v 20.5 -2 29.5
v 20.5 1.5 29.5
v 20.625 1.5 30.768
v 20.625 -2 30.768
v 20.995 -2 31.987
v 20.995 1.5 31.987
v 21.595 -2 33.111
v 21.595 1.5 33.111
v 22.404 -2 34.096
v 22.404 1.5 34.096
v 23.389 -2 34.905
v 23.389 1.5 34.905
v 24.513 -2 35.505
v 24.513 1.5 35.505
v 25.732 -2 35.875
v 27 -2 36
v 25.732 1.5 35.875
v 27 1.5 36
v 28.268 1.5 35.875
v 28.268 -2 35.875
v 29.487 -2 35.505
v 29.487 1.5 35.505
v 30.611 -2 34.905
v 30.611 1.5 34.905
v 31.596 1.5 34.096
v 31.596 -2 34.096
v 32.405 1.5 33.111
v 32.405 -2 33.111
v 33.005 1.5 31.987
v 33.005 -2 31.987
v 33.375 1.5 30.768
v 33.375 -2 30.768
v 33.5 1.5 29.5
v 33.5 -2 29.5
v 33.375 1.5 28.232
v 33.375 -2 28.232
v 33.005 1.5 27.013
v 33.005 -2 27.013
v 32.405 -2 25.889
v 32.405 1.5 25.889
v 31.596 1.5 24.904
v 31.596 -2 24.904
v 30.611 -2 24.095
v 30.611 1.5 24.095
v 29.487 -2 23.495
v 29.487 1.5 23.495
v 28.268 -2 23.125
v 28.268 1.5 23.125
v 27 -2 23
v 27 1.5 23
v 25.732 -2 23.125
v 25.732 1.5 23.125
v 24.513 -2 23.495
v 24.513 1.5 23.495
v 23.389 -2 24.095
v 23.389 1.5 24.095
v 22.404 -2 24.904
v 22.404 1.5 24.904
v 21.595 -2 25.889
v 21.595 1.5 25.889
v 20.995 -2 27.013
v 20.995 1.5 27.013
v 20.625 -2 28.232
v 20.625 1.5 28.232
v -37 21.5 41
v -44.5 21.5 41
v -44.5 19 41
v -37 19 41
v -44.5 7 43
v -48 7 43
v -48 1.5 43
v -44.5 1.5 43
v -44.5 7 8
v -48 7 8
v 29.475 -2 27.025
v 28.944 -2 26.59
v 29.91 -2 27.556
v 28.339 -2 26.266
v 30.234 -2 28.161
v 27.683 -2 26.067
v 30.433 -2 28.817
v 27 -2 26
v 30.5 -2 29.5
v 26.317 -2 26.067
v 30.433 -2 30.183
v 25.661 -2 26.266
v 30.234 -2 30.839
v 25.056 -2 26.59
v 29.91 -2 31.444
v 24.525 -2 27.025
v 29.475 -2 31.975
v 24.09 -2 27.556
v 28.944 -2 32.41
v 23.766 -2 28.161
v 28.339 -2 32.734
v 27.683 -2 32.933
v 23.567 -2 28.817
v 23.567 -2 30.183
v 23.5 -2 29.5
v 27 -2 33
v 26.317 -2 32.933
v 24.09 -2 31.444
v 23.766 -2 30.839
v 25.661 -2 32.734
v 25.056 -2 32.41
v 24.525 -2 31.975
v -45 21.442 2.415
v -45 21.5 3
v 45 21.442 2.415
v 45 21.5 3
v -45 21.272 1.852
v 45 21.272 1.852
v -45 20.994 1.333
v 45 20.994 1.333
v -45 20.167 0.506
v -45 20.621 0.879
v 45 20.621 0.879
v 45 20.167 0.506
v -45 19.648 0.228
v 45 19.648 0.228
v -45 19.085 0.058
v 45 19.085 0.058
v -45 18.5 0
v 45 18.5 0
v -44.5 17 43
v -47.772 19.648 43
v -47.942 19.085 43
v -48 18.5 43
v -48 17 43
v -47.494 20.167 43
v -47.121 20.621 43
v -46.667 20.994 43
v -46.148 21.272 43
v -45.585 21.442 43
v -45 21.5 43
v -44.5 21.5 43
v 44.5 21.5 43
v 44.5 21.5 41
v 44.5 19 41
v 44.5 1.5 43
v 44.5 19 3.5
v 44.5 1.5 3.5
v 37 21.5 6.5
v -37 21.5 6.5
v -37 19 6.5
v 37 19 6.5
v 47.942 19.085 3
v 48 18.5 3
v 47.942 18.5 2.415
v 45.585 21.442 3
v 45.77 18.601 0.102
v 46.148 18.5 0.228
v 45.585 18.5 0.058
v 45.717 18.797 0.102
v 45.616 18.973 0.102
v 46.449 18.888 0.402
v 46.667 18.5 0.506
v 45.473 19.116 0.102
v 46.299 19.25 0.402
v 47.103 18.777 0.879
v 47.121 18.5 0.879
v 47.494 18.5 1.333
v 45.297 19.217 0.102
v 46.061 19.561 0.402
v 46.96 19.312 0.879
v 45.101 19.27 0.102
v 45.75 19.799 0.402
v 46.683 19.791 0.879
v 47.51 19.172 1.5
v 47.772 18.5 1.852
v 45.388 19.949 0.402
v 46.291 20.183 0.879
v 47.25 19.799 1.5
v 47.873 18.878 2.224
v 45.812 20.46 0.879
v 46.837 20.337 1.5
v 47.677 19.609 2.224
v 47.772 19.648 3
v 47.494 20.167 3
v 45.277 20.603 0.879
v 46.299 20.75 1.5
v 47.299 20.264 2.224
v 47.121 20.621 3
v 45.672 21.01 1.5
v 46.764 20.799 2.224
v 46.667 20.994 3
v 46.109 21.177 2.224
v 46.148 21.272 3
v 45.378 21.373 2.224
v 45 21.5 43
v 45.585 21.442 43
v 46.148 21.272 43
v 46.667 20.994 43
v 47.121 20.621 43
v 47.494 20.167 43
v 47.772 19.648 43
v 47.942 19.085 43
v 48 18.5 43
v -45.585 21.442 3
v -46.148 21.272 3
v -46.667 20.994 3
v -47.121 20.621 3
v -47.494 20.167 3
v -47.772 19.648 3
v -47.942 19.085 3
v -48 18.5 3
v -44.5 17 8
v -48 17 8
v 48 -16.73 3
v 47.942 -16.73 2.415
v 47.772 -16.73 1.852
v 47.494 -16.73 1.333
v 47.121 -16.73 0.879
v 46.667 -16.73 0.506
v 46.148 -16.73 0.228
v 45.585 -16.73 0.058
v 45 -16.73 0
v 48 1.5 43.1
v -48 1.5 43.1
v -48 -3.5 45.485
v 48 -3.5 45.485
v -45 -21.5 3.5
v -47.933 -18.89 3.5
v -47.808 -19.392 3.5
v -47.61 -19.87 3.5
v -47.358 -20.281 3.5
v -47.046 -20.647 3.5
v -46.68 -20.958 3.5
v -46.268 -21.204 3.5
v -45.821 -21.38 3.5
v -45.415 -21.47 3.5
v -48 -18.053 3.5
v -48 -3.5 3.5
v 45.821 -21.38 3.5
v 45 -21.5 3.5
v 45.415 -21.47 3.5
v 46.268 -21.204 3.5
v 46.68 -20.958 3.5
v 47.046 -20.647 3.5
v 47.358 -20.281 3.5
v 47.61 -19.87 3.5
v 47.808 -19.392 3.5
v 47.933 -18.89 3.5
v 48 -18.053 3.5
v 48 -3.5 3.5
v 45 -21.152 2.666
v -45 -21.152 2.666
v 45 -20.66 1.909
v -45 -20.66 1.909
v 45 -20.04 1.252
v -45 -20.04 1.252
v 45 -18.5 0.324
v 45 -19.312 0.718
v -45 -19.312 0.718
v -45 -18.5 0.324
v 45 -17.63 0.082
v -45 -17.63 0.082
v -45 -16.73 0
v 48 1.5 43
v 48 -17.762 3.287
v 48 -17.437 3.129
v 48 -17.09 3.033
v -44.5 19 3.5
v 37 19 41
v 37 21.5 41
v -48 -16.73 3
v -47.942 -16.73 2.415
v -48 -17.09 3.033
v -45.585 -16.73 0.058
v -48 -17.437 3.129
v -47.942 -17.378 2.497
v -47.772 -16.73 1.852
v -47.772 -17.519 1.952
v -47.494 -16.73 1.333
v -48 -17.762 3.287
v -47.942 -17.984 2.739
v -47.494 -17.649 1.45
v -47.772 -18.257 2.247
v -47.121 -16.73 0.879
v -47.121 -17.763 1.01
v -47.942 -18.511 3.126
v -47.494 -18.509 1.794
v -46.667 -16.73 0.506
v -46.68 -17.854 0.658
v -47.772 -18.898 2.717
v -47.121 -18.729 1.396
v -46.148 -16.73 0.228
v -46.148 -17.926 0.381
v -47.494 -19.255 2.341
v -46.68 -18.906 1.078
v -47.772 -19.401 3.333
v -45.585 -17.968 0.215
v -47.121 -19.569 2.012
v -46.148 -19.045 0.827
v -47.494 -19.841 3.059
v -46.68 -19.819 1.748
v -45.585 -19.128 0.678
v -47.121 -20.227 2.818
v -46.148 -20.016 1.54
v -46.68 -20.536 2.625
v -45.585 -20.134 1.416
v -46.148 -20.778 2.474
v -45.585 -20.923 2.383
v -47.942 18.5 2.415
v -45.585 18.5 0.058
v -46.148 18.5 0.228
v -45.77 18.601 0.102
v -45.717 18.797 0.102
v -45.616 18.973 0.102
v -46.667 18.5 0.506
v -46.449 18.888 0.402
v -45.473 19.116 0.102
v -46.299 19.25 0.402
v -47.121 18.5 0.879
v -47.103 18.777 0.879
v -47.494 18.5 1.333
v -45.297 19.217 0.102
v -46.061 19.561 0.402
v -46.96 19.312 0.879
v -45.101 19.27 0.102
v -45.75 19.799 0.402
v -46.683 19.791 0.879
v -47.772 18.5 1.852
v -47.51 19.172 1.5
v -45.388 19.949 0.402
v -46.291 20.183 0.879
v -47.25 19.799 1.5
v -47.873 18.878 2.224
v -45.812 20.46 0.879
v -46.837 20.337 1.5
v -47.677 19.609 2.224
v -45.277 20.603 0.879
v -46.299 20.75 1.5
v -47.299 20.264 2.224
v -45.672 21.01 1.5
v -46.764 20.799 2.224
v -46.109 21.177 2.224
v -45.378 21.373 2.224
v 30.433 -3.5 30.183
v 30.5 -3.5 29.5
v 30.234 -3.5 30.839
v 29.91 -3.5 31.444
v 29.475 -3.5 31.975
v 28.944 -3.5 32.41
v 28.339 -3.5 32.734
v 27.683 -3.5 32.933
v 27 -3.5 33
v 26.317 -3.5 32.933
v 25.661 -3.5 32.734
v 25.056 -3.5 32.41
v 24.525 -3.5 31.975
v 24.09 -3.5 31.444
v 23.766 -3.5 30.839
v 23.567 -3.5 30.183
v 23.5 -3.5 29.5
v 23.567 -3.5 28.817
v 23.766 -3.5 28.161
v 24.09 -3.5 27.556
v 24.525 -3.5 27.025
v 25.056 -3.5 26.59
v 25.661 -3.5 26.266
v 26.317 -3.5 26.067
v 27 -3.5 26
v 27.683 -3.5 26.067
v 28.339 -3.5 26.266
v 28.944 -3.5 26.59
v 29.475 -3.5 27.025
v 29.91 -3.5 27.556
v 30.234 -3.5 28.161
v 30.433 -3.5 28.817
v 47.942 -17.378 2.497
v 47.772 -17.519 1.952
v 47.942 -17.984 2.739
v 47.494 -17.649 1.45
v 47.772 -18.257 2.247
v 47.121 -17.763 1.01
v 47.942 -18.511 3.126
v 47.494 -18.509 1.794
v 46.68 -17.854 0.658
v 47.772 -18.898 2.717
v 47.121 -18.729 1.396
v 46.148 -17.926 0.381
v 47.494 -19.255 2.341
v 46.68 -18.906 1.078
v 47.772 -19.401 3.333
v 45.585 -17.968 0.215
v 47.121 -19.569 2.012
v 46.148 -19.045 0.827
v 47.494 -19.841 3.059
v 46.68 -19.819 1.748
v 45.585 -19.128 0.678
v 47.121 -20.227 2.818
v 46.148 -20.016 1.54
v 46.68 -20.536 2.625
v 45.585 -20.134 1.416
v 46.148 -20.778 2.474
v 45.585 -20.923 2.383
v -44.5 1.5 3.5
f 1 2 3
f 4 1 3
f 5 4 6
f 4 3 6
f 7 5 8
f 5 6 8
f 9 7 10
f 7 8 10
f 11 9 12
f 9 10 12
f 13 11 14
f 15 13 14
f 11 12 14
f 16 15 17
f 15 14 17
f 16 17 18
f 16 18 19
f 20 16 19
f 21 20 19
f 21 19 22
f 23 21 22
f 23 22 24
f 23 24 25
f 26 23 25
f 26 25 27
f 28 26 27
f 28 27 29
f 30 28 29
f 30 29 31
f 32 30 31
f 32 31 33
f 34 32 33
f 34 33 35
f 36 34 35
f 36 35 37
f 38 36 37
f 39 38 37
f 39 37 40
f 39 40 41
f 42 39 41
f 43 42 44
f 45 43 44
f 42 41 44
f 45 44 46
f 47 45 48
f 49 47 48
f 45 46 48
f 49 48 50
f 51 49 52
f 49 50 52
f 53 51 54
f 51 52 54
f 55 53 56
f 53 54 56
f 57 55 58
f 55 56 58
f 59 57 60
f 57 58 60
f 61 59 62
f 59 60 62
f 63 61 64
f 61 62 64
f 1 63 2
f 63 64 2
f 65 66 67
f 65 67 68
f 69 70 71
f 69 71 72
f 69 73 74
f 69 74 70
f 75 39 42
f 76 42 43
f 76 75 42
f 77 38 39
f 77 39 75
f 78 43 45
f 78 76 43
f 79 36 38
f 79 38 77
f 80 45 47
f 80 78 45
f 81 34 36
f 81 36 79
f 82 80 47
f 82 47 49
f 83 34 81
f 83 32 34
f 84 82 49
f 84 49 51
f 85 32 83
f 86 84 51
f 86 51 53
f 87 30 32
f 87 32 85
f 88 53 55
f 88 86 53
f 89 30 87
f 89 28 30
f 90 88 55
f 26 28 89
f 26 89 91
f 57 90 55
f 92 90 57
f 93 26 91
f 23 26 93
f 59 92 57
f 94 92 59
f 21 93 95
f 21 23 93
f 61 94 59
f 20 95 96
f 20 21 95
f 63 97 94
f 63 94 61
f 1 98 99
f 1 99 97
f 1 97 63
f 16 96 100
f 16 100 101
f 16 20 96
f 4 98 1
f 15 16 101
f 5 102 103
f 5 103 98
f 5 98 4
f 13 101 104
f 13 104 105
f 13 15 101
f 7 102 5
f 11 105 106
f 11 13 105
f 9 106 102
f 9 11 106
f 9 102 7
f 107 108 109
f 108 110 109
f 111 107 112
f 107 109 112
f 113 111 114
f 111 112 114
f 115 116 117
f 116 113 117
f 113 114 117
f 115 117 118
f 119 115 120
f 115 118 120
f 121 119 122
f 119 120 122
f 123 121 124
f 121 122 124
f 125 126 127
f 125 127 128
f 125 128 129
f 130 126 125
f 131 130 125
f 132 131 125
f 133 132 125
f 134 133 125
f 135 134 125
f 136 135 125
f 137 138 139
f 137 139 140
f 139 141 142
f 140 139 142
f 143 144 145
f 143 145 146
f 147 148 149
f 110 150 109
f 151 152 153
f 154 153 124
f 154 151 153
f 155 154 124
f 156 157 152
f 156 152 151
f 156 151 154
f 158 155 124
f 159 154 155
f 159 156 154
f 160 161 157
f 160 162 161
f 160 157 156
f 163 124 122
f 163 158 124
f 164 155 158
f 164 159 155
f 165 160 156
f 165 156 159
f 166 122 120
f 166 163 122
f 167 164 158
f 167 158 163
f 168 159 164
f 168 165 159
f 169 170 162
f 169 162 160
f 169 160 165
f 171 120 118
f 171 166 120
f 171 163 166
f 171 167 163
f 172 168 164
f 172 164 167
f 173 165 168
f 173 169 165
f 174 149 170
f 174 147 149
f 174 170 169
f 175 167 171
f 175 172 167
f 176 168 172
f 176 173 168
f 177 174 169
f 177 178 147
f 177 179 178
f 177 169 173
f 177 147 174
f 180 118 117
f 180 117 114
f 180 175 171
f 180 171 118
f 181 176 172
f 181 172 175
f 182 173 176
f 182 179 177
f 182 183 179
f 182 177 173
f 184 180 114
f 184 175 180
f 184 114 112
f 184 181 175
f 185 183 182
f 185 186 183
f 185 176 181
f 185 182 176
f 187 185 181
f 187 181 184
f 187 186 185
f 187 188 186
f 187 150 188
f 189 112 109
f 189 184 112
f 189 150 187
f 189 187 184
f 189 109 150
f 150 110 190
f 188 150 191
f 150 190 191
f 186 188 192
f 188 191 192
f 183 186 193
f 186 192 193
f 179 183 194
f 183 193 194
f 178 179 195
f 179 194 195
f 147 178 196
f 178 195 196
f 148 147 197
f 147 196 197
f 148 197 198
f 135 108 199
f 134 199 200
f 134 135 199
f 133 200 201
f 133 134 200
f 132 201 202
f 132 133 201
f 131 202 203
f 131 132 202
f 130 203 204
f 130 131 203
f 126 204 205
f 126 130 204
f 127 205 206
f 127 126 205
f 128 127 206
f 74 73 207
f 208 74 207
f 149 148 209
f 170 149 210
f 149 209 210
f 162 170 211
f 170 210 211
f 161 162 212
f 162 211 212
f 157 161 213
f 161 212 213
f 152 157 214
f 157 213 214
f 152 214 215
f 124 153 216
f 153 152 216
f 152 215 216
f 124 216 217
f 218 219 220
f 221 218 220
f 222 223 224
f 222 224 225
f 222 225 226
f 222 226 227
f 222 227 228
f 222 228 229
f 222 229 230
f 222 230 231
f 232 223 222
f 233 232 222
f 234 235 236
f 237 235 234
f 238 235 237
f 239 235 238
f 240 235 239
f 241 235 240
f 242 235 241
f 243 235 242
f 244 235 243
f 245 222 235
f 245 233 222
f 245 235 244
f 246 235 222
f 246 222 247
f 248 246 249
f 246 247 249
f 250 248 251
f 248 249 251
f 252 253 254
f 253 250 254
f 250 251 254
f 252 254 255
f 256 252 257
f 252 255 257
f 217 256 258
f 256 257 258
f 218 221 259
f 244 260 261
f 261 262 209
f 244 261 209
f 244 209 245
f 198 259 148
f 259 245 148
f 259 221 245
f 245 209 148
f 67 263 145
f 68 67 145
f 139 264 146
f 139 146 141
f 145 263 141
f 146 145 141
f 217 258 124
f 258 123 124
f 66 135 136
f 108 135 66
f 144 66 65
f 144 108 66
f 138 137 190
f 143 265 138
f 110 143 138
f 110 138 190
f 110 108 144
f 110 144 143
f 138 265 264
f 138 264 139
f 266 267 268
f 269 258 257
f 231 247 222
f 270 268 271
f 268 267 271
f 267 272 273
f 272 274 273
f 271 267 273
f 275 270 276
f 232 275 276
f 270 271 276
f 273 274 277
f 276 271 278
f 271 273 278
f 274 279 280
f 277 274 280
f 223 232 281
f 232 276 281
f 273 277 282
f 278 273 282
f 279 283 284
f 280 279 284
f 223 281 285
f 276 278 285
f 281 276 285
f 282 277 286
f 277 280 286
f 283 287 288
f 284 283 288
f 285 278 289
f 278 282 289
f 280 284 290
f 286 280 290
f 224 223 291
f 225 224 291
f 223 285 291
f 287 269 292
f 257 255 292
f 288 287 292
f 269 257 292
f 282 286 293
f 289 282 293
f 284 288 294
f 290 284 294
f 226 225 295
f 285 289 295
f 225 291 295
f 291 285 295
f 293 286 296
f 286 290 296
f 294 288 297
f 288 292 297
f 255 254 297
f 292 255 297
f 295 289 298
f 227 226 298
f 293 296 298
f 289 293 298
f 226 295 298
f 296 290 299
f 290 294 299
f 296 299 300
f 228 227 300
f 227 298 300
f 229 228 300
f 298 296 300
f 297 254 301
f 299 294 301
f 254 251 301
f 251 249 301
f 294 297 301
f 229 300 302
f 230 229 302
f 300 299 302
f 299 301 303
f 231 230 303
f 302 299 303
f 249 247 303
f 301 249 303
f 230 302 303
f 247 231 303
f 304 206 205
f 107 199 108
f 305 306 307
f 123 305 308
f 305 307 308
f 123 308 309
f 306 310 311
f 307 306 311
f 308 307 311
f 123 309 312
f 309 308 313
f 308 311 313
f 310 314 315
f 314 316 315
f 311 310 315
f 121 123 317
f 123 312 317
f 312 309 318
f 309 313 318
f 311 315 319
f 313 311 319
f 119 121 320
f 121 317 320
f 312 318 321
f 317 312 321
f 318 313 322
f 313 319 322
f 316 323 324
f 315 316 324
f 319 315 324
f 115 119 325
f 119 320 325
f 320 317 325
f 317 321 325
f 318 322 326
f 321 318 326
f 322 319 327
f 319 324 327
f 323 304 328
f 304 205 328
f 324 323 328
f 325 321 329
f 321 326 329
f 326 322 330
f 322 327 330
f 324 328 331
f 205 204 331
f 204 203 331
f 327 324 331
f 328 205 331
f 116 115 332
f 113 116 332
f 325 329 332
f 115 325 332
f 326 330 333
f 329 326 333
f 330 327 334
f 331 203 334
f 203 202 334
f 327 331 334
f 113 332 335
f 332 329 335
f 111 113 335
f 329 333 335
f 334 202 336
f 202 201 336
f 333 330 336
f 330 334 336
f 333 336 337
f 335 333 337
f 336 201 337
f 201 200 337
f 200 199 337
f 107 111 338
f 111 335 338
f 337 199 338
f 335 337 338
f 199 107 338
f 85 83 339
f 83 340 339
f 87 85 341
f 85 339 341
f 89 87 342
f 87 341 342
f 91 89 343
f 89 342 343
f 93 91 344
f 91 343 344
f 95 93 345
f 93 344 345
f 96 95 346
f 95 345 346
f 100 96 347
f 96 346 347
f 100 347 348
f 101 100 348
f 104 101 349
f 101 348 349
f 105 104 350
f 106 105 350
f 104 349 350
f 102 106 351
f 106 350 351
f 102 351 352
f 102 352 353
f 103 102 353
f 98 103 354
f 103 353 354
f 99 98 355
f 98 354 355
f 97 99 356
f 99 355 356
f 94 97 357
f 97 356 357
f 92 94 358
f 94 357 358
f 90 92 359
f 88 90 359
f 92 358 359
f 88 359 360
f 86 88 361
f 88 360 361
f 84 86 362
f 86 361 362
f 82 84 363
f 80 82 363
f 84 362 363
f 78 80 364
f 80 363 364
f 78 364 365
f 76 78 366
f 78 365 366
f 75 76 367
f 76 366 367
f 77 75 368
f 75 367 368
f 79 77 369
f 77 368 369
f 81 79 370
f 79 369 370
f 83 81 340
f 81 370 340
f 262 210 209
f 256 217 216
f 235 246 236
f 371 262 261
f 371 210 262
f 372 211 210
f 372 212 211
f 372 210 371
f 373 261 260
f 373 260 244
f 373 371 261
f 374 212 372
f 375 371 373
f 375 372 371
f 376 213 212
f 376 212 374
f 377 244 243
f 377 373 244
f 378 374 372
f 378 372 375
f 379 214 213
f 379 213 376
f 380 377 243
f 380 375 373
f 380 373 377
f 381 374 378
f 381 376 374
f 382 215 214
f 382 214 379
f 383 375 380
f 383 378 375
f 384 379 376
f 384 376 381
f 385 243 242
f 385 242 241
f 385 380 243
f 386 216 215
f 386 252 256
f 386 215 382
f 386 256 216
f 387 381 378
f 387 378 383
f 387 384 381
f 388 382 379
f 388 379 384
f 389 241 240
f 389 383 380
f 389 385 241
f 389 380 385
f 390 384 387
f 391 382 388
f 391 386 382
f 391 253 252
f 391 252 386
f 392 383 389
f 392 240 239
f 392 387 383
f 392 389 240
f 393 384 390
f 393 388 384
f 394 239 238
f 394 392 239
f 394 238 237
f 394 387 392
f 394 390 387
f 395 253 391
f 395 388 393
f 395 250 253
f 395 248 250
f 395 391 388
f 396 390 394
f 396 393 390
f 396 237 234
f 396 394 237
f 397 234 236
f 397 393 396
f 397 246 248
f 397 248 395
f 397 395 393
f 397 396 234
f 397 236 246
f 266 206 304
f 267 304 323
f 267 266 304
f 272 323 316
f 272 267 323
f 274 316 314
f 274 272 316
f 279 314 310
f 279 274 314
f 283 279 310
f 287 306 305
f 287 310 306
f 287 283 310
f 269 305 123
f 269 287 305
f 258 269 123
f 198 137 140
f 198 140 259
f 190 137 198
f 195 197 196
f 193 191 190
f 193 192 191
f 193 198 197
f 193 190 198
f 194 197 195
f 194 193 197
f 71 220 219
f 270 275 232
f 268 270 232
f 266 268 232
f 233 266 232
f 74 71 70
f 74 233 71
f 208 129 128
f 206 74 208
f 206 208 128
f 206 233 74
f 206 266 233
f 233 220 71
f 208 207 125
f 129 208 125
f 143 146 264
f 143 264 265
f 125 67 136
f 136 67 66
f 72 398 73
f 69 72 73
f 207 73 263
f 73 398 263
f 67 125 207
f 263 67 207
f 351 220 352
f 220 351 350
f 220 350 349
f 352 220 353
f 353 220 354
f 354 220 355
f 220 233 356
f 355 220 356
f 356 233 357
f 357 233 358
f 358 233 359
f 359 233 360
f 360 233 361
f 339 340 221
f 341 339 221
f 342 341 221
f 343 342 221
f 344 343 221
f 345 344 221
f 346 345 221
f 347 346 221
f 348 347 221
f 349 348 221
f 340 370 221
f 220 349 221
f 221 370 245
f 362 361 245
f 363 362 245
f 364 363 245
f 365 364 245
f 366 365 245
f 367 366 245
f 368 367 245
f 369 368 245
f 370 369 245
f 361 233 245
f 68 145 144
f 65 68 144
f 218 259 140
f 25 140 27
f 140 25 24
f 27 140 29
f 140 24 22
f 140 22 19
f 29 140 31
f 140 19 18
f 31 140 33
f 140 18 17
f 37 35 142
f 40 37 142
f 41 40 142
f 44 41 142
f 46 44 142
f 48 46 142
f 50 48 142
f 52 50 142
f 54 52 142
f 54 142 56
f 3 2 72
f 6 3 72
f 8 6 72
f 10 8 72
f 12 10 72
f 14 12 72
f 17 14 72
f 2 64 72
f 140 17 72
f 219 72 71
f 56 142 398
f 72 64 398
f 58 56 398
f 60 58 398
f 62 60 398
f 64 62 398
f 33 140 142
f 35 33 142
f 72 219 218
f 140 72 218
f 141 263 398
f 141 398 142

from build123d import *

# Parameters (mm, degrees)
F0_W           = 96
F0_H           = 43
F1_DEPTH       = 3.5
F2_T1_DEPTH    = 119.8484800354
F4_DEPTH       = 42
F5_T1_DEPTH    = 122.0704317696
F7_D           = 7
F7_CBORE_D     = 13
F7_CBORE_DEPTH = 3.5
F8_DEPTH       = 39.5
F3_W           = 89
F3_H           = 2.5
F9_DEPTH       = 3
F10_W          = 7.5
F10_H          = 2.5
F11_DEPTH      = 34.5
F12_W          = 10
F12_H          = 35
F13_DEPTH      = 3.5
F14_R          = 3


# Not quite as in the source:
# - a fillet or chamfer that OpenCascade refuses, or shapes differently, is made with other operations: its cross-section is extruded or revolved along the edge and cut away or added


with BuildPart() as f1:
    # F0 (on Top) → F1 (new body)
    with BuildSketch(Plane.XY):
        Rectangle(F0_W, F0_H)
    extrude(amount=F1_DEPTH)

    # F2: fillet of radius 5 on 1 edges, made by hand

    # F2_s2 → F2_t1 (cut)
    with BuildSketch(Plane.YZ.offset(-59.9242400177)):
        with BuildLine():
            ThreePointArc((-21.5, 3.5), (-19.6883438845, 0.9688711259), (-16.7303039929, 0))
            Line((-16.7303039929, 0), (-21.5, 0))
            Line((-21.5, 0), (-21.5, 3.5))
        make_face()
    extrude(amount=F2_T1_DEPTH, mode=Mode.SUBTRACT)

    # F3 (on face) → F4 (join)
    with BuildSketch(Plane.XY.offset(3.5)):
        Polygon((-48, 1.5), (-48, -3.5), (48, -3.5), (48, 1.5), (44.5, 1.5), (-44.5, 1.5), align=None)
    extrude(amount=F4_DEPTH)

    # F5: chamfer of 2.4 x 5.0317046378 on 1 edges, made by hand

    # F5_s2 → F5_t1 (cut)
    with BuildSketch(Plane.YZ.offset(-61.0352158848)):
        Polygon((1.5, 43.1), (-3.5317046378, 45.5), (1.5, 45.5), align=None)
    extrude(amount=F5_T1_DEPTH, mode=Mode.SUBTRACT)

    # F7 (through all)
    with Locations(Plane(origin=(0, 1.5, 0), x_dir=(-1, 0, 0), z_dir=(0, 1, 0))):
        with Locations((-27, 29.5)):
            CounterBoreHole(F7_D / 2, F7_CBORE_D / 2, F7_CBORE_DEPTH)

    # F3 (on face) → F8 (join)
    with BuildSketch(Plane.XY.offset(3.5)):
        Polygon((44.5, 1.5), (48, 1.5), (48, 21.5), (44.5, 21.5), (44.5, 19), align=None)
        Polygon((-48, 21.5), (-48, 1.5), (-44.5, 1.5), (-44.5, 19), (-44.5, 21.5), align=None)
    extrude(amount=F8_DEPTH)

    # F3 (on face) → F9 (join)
    with BuildSketch(Plane.XY.offset(3.5)):
        with Locations((0, 20.25)):
            Rectangle(F3_W, F3_H)
    extrude(amount=F9_DEPTH)

    # F10 (on face) → F11 (join)
    with BuildSketch(Plane.XY.offset(6.5)):
        with Locations((40.75, 20.25)):
            Rectangle(F10_W, F10_H)
        with Locations((-40.75, 20.25)):
            Rectangle(F10_W, F10_H)
    extrude(amount=F11_DEPTH)

    # F12 (on face) → F13 (cut)
    with BuildSketch(Plane.YZ.offset(-44.5)):
        with Locations((12, 25.5)):
            Rectangle(F12_W, F12_H)
    extrude(amount=-F13_DEPTH, mode=Mode.SUBTRACT)

    # F14
    f14_edges = [f1.edges().sort_by_distance(p)[0] for p in [
        (-48, 21.5, 21.5),
        (48, 21.5, 21.5),
        (-48, -19.688344, 0.968871),
        (48, -19.688344, 0.968871),
        (0, 21.5, 0),
        (48, 2.384848, 0),
        (-48, 2.384848, 0),
    ]]
    fillet(f14_edges, radius=F14_R)


solid = f1.part
